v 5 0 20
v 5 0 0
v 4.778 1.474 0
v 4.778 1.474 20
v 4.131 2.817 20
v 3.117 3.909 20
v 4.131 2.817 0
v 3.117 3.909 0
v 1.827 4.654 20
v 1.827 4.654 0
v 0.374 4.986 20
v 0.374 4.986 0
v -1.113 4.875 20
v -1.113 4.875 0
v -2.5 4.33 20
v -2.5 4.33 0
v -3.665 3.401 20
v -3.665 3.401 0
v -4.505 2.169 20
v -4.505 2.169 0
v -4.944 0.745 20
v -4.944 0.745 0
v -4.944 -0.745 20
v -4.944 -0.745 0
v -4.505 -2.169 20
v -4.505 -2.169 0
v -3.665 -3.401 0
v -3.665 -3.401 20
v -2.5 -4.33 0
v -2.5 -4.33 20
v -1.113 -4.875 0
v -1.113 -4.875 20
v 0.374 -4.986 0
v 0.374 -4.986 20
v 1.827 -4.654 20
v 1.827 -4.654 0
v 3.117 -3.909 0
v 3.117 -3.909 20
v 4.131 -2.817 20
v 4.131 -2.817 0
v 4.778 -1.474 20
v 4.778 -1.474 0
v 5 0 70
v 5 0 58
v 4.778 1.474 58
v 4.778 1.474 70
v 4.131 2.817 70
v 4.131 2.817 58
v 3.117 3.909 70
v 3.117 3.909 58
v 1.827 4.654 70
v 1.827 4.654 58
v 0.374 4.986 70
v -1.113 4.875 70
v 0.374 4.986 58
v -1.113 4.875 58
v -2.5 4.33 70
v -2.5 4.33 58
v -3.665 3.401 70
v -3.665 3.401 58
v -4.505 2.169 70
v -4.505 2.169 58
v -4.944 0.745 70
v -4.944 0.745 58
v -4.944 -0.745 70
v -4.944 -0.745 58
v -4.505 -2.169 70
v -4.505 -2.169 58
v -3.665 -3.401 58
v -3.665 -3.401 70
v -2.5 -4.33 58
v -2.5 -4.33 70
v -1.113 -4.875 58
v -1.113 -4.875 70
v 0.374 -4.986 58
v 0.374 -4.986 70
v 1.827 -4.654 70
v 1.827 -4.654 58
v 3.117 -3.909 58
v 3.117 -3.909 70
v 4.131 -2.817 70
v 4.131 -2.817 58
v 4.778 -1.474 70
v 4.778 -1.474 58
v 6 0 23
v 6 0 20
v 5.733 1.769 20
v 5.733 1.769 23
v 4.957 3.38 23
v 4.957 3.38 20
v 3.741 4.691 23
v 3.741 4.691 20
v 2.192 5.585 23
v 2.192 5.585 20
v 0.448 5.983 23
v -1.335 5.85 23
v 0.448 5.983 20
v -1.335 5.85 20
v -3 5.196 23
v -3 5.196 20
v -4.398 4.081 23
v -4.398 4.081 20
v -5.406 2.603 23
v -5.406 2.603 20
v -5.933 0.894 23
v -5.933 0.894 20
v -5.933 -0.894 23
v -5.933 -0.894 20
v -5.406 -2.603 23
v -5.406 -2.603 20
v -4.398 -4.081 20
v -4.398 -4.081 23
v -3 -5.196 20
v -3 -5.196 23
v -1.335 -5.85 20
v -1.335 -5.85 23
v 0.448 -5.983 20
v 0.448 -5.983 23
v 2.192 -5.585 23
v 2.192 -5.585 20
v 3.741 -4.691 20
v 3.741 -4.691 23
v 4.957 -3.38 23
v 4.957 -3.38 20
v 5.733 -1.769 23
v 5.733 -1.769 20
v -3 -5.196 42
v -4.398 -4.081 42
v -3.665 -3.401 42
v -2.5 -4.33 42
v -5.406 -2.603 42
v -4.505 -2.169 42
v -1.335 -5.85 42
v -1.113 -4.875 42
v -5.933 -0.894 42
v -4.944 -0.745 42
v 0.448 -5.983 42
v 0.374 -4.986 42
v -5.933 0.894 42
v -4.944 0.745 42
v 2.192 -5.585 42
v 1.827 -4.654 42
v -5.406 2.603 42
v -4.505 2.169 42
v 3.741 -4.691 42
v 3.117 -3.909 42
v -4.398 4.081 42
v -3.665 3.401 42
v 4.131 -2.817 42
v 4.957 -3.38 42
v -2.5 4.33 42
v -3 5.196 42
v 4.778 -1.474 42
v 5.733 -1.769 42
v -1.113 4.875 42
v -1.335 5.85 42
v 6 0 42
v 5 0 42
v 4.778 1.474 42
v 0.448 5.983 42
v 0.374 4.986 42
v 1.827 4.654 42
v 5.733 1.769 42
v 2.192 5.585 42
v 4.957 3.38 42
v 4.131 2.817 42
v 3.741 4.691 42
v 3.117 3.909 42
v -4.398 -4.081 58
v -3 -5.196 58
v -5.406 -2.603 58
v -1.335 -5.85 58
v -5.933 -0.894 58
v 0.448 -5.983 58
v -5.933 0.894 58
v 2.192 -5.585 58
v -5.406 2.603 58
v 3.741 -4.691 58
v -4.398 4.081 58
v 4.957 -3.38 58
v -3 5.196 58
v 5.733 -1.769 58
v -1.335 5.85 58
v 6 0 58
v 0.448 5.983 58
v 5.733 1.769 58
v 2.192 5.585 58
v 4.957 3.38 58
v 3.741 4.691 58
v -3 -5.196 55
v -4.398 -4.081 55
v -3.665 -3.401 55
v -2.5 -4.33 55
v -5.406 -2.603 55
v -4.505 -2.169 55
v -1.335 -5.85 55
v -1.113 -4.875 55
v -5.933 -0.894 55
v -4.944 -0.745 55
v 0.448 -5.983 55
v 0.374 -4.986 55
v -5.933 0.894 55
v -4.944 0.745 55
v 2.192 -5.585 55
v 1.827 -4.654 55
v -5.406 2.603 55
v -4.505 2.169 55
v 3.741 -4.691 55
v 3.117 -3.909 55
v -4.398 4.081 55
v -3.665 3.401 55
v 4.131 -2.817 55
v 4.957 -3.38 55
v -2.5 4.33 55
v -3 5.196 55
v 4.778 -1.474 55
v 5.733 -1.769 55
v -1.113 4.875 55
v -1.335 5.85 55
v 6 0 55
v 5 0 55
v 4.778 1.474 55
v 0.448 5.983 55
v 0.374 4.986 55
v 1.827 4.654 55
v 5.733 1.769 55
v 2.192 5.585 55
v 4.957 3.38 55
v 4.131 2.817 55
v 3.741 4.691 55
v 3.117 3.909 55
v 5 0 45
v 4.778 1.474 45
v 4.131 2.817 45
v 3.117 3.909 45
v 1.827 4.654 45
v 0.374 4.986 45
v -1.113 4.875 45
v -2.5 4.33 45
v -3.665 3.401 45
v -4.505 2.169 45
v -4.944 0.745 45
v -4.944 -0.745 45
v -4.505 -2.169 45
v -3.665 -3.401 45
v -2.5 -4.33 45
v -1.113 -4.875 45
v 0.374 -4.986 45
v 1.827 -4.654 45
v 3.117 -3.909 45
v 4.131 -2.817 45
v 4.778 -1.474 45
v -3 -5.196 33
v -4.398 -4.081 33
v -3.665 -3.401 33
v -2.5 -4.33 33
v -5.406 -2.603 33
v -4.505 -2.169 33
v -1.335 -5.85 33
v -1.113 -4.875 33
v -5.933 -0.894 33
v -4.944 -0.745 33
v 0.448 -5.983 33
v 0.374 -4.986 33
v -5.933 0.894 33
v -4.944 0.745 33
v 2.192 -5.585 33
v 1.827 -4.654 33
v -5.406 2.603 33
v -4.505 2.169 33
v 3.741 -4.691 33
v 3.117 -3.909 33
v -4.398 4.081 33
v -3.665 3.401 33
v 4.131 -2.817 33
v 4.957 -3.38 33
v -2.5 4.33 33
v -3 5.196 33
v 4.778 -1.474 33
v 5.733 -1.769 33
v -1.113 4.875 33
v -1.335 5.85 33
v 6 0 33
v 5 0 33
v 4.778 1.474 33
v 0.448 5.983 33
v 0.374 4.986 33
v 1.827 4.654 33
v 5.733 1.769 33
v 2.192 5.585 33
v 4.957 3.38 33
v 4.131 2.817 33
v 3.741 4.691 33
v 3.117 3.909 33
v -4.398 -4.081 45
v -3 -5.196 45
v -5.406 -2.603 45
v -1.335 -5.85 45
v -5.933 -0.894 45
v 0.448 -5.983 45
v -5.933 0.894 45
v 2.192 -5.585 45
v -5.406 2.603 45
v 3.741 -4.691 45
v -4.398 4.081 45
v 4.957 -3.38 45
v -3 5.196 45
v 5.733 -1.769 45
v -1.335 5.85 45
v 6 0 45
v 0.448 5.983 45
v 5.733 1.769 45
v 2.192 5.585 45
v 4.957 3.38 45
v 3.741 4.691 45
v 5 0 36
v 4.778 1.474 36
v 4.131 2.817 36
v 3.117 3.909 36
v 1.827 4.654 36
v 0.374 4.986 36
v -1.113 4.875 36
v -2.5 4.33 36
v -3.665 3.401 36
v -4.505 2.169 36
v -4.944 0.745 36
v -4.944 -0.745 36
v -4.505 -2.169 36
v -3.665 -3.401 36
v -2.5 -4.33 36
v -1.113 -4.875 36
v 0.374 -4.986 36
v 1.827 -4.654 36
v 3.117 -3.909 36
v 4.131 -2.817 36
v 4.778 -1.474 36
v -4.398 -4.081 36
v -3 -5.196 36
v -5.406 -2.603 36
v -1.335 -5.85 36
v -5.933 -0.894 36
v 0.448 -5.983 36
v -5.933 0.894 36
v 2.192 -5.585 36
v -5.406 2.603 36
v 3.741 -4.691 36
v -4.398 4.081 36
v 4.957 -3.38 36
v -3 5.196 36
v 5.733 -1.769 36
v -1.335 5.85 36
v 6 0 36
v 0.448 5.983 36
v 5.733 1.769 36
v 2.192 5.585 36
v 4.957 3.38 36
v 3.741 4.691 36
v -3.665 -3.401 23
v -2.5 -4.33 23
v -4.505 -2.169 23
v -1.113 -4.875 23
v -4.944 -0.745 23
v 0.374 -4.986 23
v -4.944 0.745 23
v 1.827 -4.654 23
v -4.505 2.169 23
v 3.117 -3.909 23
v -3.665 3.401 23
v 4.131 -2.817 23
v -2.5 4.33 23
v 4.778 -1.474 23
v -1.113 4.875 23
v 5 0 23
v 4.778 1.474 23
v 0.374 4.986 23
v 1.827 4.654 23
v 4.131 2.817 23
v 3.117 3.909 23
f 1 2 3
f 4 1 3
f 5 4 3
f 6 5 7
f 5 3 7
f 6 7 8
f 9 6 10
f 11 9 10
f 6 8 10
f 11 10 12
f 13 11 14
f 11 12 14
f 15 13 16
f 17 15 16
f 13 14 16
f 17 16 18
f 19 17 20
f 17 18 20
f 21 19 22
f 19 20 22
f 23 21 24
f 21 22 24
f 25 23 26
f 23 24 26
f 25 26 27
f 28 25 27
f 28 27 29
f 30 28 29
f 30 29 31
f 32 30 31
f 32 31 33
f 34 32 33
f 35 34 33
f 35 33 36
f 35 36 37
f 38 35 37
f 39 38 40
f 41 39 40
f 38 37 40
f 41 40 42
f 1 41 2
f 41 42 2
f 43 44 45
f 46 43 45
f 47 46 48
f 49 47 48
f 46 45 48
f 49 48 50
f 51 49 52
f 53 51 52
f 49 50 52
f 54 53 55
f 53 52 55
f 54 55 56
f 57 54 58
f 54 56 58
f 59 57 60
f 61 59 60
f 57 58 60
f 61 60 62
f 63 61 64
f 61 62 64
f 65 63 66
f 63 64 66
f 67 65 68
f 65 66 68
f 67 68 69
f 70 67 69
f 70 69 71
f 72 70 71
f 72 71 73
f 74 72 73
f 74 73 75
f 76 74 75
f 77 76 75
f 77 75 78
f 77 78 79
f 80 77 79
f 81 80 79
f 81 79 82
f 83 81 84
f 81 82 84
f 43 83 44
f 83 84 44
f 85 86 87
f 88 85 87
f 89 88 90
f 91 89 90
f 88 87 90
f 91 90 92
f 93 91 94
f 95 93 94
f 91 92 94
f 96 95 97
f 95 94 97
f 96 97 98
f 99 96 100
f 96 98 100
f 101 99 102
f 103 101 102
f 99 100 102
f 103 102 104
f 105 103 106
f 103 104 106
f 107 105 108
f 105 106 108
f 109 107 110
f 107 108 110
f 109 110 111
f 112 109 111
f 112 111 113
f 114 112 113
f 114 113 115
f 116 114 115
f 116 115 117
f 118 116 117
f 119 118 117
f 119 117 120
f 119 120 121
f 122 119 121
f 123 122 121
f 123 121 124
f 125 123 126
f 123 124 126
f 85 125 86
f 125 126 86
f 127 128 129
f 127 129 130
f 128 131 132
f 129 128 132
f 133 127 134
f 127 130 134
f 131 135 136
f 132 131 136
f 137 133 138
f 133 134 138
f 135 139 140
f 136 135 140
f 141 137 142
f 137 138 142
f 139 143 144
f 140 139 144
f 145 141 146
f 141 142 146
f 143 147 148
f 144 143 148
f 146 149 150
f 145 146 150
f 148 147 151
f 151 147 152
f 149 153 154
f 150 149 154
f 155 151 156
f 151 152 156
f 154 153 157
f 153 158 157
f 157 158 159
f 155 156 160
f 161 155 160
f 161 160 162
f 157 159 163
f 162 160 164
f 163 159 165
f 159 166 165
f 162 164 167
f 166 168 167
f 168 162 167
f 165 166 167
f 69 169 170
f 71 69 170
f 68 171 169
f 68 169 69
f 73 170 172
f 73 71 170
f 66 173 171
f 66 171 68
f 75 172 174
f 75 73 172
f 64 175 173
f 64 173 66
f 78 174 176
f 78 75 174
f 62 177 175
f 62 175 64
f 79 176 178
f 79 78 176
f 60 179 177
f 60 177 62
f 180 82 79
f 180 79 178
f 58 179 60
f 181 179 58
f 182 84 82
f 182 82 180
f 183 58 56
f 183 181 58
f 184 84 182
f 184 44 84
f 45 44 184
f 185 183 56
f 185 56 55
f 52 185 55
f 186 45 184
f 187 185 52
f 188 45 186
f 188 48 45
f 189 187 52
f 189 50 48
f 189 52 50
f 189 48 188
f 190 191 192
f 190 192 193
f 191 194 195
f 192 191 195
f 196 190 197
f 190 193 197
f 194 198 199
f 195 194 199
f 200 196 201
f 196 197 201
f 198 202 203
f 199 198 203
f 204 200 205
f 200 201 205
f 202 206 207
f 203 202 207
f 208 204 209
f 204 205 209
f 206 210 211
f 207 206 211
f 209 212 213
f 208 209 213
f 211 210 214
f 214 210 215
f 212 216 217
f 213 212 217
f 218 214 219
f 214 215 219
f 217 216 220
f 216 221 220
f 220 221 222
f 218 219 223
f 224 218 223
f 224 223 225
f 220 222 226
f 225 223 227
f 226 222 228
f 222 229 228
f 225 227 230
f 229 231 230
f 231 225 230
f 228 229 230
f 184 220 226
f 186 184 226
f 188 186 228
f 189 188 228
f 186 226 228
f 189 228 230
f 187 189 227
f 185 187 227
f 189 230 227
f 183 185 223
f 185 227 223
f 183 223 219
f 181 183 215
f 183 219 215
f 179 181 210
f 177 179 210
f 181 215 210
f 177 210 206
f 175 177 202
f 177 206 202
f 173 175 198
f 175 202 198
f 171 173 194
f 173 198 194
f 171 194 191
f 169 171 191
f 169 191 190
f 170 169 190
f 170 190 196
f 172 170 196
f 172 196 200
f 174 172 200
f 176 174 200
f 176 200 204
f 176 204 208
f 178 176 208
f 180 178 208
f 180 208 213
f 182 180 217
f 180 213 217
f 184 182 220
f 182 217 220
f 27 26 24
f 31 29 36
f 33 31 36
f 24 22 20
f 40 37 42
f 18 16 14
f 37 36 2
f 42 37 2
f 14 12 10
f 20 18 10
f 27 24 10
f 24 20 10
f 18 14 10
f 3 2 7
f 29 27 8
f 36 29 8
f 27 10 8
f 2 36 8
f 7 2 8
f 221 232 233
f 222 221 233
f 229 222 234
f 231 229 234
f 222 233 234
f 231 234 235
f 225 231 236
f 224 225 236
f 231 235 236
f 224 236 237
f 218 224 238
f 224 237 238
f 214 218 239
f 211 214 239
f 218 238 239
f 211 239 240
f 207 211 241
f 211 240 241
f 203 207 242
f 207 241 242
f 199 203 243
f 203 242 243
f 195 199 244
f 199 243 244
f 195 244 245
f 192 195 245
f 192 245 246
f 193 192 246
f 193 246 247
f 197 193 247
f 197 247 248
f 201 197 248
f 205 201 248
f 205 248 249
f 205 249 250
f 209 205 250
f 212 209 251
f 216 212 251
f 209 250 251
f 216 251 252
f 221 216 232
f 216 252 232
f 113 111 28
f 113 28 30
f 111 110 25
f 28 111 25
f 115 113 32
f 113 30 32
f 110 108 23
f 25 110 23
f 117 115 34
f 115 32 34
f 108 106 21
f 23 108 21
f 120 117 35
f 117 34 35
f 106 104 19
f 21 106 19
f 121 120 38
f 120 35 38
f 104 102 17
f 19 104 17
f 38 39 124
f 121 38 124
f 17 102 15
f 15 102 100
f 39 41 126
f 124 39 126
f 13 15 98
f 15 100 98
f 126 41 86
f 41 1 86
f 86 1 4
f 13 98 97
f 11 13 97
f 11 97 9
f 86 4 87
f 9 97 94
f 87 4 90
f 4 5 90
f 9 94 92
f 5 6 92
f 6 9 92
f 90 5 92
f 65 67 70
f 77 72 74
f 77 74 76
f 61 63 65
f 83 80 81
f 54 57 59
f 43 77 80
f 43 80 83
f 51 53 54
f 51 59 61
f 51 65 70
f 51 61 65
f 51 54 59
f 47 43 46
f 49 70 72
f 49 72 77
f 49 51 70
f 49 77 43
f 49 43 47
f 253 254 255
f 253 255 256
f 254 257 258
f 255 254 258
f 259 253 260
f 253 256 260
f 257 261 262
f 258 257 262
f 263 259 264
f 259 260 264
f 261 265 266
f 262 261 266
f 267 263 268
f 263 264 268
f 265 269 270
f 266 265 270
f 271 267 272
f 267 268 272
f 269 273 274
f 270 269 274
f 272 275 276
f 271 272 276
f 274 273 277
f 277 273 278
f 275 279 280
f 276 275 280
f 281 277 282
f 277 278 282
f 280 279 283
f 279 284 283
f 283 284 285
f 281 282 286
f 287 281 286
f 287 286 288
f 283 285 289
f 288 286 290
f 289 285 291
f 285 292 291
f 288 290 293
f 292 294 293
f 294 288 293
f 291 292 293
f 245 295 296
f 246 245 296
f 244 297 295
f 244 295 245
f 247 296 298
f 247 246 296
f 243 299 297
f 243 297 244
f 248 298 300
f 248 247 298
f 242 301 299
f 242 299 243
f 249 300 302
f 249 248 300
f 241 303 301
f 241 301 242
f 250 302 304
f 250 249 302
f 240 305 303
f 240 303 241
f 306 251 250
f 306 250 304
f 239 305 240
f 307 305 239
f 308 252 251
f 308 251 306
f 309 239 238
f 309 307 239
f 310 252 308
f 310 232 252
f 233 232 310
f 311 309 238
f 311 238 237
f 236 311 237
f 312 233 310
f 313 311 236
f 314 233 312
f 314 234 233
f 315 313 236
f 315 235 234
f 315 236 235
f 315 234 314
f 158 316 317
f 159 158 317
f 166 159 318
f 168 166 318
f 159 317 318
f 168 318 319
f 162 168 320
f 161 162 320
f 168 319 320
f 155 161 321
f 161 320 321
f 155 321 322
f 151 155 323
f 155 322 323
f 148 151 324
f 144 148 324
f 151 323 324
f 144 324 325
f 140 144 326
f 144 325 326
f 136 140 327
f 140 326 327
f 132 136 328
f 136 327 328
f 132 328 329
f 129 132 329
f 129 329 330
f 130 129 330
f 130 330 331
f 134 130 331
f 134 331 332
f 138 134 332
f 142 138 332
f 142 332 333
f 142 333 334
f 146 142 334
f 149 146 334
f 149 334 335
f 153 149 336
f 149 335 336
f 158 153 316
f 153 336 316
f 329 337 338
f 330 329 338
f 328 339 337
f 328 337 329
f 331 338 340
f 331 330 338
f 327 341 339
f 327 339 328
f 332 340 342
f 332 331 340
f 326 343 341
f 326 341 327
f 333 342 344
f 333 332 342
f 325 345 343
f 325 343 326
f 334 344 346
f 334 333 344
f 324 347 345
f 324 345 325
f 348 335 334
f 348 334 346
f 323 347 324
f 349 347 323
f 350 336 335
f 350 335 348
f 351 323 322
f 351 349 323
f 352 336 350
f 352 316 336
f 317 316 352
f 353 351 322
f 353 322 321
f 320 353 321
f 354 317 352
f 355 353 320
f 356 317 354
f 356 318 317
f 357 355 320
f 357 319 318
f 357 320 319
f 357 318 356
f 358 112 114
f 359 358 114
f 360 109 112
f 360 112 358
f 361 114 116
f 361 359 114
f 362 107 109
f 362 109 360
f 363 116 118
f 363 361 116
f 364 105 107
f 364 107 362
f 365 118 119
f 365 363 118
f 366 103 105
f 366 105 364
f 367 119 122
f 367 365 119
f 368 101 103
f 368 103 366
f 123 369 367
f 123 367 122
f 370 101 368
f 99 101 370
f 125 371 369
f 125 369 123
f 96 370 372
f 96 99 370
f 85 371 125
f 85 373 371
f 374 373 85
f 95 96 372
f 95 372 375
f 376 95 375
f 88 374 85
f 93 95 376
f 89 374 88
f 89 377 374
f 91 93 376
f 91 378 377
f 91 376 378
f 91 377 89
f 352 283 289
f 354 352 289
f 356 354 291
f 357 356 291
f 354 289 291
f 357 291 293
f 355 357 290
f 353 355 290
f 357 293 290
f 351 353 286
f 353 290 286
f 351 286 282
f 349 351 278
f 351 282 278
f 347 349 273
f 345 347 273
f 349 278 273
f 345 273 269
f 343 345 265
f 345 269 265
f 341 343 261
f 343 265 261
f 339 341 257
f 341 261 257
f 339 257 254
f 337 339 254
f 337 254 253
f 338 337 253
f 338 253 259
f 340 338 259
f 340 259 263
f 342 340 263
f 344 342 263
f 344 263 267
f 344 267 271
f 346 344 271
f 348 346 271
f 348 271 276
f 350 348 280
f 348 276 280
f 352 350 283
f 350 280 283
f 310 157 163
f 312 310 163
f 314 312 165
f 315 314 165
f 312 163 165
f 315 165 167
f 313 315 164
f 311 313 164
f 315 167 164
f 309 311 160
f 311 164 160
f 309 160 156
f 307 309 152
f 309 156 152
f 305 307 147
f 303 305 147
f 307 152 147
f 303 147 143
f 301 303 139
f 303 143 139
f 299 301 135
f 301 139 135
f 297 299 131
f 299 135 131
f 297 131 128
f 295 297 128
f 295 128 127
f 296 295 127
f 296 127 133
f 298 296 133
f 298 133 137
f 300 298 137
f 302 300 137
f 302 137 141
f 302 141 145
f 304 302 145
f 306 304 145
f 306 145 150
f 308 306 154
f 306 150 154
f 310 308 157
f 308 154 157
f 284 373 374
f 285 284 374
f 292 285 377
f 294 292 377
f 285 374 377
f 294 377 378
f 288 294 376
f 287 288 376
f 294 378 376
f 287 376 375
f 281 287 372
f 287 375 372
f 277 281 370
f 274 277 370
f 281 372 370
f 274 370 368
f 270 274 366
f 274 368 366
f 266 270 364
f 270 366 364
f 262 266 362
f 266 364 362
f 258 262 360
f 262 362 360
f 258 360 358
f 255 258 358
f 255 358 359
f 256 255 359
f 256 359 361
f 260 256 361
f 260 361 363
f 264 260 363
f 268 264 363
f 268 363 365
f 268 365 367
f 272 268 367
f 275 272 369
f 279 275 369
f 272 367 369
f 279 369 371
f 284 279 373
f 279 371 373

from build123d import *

# Parameters (mm, degrees)
SKETCH1_R           = 5
BOSS_EXTRUDE1_DEPTH = 20
SKETCH2_R           = 6
BOSS_EXTRUDE2_DEPTH = 3
SKETCH3_R           = 5
BOSS_EXTRUDE3_DEPTH = 10
SKETCH4_R           = 6
BOSS_EXTRUDE4_DEPTH = 3
SKETCH5_R           = 5
BOSS_EXTRUDE5_DEPTH = 6
SKETCH6_R           = 6
BOSS_EXTRUDE6_DEPTH = 3
SKETCH7_R           = 5
BOSS_EXTRUDE7_DEPTH = 10
SKETCH8_R           = 6
BOSS_EXTRUDE8_DEPTH = 3
SKETCH9_R           = 5
BOSS_EXTRUDE9_DEPTH = 12


with BuildPart() as part:
    # Sketch1 → Boss-Extrude1 (new body)
    with BuildSketch(Plane.XY):
        Circle(SKETCH1_R)
    extrude(amount=BOSS_EXTRUDE1_DEPTH)

    # Sketch2 → Boss-Extrude2 (add)
    with BuildSketch(Plane.XY.offset(20)):
        Circle(SKETCH2_R)
    extrude(amount=BOSS_EXTRUDE2_DEPTH)

    # Sketch3 → Boss-Extrude3 (add)
    with BuildSketch(Plane.XY.offset(23)):
        Circle(SKETCH3_R)
    extrude(amount=BOSS_EXTRUDE3_DEPTH)

    # Sketch4 → Boss-Extrude4 (add)
    with BuildSketch(Plane.XY.offset(33)):
        Circle(SKETCH4_R)
    extrude(amount=BOSS_EXTRUDE4_DEPTH)

    # Sketch5 → Boss-Extrude5 (add)
    with BuildSketch(Plane.XY.offset(36)):
        Circle(SKETCH5_R)
    extrude(amount=BOSS_EXTRUDE5_DEPTH)

    # Sketch6 → Boss-Extrude6 (add)
    with BuildSketch(Plane.XY.offset(42)):
        Circle(SKETCH6_R)
    extrude(amount=BOSS_EXTRUDE6_DEPTH)

    # Sketch7 → Boss-Extrude7 (add)
    with BuildSketch(Plane.XY.offset(45)):
        Circle(SKETCH7_R)
    extrude(amount=BOSS_EXTRUDE7_DEPTH)

    # Sketch8 → Boss-Extrude8 (add)
    with BuildSketch(Plane.XY.offset(55)):
        Circle(SKETCH8_R)
    extrude(amount=BOSS_EXTRUDE8_DEPTH)

    # Sketch9 → Boss-Extrude9 (add)
    with BuildSketch(Plane.XY.offset(58)):
        Circle(SKETCH9_R)
    extrude(amount=BOSS_EXTRUDE9_DEPTH)


solid = part.part
